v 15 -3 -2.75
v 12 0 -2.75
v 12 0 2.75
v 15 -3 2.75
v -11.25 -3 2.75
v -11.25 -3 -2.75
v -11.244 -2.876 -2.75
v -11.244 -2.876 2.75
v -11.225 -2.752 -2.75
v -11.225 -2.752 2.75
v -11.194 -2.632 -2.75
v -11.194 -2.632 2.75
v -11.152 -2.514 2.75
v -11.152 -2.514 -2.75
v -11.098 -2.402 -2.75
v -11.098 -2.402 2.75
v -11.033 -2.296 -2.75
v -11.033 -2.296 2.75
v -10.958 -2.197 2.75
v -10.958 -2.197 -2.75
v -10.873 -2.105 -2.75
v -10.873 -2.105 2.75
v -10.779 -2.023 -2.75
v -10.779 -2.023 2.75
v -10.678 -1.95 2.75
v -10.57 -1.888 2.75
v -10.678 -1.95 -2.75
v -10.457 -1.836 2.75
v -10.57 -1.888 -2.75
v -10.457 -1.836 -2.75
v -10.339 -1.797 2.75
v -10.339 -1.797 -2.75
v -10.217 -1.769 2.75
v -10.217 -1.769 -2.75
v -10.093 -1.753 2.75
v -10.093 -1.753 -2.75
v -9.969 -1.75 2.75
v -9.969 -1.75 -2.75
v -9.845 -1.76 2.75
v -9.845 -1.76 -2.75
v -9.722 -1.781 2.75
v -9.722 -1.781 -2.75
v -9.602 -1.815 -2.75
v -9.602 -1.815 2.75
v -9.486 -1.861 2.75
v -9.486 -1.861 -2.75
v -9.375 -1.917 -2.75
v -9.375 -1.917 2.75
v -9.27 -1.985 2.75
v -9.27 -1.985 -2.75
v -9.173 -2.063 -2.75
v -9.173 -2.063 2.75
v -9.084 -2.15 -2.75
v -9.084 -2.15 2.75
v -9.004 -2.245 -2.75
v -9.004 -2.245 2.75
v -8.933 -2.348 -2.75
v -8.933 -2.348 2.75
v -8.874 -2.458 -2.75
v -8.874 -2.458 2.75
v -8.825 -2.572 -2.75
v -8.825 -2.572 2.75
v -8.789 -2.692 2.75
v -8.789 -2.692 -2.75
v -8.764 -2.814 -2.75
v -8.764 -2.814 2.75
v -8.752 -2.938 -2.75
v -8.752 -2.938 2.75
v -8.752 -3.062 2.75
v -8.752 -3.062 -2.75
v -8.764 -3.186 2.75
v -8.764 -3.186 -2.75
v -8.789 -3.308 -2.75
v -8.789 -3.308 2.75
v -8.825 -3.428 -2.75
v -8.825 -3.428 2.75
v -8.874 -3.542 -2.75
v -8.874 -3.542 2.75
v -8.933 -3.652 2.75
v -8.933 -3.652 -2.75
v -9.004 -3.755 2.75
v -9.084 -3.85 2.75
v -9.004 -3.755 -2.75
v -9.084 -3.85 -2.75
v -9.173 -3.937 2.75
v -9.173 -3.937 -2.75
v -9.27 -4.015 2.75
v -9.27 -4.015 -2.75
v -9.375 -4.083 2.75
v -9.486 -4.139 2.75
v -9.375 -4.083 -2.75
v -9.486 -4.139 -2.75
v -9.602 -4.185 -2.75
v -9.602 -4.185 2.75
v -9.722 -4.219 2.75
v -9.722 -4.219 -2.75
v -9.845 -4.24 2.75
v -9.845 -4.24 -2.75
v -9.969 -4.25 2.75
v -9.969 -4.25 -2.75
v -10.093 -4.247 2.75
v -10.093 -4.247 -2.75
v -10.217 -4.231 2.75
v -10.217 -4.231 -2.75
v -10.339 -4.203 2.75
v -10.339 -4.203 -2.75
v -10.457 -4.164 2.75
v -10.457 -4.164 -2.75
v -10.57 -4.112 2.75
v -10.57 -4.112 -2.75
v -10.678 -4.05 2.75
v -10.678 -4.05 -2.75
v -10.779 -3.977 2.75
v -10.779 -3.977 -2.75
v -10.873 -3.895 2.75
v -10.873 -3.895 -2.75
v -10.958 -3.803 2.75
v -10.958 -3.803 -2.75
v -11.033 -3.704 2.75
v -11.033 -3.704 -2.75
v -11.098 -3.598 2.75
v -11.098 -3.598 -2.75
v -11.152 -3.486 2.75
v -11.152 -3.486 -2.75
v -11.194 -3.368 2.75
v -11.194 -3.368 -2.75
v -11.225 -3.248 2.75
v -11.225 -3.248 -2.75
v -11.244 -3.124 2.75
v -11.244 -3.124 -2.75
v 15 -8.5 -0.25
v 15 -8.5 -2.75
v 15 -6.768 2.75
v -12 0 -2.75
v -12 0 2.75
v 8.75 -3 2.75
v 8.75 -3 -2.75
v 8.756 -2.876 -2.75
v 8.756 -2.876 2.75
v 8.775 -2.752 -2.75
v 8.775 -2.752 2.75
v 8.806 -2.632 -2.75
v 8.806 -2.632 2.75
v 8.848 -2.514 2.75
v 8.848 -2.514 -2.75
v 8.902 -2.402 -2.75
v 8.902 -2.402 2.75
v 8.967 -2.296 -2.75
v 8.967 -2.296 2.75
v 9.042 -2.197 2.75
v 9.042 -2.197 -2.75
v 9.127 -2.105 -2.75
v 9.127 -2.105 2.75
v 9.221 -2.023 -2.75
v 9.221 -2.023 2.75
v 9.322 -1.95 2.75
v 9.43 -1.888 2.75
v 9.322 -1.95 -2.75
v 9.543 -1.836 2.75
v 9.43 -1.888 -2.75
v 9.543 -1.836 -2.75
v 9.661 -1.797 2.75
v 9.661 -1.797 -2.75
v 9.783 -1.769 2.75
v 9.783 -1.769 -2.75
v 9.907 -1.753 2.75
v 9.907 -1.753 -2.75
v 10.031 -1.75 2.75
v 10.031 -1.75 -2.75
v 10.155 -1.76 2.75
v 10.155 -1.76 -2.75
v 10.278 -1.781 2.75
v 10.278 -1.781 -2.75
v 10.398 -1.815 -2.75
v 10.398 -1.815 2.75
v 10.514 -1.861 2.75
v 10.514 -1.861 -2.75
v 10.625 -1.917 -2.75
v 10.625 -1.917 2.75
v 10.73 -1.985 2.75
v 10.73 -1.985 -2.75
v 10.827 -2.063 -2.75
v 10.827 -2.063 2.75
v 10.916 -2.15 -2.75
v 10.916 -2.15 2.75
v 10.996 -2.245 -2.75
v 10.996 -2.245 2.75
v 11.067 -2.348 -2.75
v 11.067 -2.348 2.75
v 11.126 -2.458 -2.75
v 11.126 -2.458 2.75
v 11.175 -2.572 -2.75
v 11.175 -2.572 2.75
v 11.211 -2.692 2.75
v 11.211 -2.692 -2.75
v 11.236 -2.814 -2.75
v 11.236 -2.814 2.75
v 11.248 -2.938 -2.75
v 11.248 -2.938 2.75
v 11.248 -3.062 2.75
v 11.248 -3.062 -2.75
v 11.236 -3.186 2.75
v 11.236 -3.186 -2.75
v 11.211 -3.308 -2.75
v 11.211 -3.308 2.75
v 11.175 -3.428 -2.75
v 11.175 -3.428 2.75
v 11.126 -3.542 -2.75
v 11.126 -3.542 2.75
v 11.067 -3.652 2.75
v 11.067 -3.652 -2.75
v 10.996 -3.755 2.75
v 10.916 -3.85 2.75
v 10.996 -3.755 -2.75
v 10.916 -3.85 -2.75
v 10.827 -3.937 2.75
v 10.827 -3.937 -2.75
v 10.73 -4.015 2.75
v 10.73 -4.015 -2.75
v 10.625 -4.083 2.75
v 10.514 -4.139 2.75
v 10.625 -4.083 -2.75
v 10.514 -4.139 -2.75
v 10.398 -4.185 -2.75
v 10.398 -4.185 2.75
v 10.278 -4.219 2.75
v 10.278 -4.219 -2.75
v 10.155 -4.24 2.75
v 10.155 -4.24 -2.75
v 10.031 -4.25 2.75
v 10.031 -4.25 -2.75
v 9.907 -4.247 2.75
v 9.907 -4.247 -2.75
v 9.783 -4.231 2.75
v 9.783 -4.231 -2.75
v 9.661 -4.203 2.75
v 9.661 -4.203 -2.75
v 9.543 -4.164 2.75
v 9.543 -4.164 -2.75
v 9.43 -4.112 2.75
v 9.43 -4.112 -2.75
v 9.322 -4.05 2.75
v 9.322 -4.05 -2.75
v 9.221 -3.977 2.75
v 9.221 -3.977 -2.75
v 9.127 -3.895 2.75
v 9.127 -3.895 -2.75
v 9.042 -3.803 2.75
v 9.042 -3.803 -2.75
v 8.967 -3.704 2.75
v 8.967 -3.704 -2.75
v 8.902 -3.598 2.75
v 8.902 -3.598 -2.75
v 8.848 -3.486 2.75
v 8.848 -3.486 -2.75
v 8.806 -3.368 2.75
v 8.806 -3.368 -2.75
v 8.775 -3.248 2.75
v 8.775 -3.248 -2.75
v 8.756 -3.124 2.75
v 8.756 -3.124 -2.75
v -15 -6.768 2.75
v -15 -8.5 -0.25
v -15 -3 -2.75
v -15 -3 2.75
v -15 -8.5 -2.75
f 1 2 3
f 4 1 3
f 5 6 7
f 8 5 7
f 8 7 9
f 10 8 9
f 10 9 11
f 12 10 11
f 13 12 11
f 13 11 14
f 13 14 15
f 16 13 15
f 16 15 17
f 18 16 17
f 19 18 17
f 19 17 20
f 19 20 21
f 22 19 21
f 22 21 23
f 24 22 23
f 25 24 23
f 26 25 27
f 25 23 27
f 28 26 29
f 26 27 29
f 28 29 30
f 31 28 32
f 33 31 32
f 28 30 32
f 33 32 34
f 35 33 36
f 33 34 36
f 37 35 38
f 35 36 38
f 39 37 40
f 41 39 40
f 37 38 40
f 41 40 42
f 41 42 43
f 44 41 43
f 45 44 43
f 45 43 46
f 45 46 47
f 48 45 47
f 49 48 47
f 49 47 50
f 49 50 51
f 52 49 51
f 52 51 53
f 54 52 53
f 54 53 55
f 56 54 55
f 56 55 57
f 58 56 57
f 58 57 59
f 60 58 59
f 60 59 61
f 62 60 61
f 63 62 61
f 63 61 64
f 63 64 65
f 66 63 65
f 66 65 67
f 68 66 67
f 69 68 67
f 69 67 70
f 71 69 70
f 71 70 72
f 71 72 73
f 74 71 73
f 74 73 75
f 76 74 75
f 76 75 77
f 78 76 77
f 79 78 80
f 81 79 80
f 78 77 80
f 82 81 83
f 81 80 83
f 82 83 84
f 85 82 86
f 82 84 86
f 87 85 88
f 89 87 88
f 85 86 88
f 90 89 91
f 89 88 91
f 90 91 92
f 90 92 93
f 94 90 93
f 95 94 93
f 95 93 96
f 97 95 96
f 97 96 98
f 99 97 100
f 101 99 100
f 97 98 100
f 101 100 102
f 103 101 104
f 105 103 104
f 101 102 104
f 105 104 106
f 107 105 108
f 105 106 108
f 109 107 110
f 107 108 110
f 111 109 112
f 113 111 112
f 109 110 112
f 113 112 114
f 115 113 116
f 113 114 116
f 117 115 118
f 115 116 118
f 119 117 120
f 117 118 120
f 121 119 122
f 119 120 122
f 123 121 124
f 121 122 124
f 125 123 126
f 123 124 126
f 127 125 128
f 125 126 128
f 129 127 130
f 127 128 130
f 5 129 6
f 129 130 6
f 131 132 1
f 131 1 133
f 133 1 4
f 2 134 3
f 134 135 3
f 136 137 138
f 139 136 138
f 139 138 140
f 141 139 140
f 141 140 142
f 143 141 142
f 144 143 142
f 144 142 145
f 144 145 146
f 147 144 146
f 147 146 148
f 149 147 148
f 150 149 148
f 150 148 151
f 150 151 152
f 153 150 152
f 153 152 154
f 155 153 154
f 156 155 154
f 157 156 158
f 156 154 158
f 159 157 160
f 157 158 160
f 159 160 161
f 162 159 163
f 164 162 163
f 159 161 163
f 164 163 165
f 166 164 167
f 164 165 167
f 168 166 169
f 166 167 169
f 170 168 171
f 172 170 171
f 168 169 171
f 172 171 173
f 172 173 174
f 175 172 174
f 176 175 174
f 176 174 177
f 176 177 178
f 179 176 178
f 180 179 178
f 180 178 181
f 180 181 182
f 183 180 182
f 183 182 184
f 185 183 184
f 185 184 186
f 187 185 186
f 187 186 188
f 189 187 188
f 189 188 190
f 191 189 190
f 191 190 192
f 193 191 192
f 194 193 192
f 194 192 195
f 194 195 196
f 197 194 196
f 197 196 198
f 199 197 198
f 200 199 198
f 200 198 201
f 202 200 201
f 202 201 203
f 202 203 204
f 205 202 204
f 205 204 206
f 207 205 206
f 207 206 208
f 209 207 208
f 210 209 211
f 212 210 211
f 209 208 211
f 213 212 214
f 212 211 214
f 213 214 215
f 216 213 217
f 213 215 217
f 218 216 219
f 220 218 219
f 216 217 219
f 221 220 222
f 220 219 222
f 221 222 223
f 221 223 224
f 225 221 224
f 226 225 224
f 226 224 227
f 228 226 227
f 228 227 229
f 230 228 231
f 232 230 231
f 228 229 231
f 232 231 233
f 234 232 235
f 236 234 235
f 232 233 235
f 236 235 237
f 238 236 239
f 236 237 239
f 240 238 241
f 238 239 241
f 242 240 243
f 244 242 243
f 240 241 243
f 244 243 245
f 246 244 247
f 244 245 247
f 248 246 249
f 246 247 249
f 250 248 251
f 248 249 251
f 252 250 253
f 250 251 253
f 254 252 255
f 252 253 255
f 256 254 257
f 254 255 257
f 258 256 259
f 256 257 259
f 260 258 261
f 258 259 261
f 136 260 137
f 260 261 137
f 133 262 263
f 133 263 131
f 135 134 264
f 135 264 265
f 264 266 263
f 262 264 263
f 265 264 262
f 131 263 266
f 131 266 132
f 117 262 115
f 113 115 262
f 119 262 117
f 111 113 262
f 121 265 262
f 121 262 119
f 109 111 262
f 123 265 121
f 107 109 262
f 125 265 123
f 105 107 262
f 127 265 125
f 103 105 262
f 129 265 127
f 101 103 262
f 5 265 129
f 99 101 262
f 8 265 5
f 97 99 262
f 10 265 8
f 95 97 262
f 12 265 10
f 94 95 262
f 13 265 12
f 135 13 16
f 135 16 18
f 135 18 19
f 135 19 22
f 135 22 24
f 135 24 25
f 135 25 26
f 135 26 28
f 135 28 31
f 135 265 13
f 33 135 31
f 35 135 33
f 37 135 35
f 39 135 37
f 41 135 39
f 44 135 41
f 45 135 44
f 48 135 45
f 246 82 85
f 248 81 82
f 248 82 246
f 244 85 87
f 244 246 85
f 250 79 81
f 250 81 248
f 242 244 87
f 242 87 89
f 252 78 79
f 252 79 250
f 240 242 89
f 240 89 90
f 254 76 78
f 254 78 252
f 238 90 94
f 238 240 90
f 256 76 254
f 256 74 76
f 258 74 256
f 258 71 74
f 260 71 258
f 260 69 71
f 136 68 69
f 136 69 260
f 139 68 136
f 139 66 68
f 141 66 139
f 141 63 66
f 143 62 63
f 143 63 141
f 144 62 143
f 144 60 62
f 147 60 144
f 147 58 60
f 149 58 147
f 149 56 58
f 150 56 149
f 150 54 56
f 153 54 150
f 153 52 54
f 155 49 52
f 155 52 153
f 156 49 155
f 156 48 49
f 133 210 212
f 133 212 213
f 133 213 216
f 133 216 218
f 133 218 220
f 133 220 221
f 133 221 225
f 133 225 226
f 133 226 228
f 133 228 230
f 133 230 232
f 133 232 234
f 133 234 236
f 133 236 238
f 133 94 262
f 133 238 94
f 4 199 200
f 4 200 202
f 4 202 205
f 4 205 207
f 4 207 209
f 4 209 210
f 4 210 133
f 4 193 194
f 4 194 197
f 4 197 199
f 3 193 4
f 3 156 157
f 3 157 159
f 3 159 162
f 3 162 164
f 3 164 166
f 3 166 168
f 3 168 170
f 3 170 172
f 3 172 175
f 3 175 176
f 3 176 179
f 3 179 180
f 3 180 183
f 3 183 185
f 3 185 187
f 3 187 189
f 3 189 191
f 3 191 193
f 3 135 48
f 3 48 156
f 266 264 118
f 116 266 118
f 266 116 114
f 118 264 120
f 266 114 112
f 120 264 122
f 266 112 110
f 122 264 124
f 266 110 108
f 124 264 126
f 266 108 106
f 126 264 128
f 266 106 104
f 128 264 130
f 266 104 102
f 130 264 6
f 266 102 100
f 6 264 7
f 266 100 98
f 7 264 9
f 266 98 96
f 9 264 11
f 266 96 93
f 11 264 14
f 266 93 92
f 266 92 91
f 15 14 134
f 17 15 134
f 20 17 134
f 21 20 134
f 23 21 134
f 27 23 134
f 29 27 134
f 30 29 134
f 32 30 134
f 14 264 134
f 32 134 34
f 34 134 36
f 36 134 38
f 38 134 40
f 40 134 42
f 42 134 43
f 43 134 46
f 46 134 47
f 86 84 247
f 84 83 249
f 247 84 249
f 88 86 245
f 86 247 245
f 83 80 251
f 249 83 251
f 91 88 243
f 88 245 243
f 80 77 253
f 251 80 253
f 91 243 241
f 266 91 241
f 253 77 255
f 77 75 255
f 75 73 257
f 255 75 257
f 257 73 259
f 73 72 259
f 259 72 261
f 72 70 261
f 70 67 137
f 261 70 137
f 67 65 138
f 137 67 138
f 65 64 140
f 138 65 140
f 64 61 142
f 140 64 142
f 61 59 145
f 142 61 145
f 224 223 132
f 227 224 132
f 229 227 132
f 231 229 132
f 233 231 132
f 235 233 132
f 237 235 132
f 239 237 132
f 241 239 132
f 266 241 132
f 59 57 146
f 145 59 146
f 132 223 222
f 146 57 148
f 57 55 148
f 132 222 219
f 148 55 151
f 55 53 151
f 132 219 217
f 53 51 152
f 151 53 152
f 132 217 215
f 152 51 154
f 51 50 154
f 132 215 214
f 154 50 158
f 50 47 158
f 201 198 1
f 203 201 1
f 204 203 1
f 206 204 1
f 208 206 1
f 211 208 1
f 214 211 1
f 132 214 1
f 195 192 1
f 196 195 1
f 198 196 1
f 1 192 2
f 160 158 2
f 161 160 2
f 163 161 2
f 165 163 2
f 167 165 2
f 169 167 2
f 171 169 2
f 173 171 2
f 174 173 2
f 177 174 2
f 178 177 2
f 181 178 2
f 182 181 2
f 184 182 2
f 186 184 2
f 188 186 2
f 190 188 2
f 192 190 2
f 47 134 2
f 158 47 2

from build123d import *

# Parameters (mm, degrees)
F0_W     = 30
F0_H     = 5.5
F1_DEPTH = 8.5
F2_SIZE  = 3
F3_SIZE2 = 1.7320508076
F3_SIZE  = 3
F5_D     = 2.5


with BuildPart() as f1:
    # F0 (on Front) → F1 (new body)
    with BuildSketch(Plane.XZ):
        Rectangle(F0_W, F0_H)
    extrude(amount=F1_DEPTH)

    # F2
    f2_edges = [f1.edges().sort_by_distance(p)[0] for p in [
        (-15, 0, 0),
        (15, 0, 0),
    ]]
    chamfer(f2_edges, length=F2_SIZE)

    # F3
    f3_edges = [f1.edges().sort_by_distance(p)[0] for p in [
        (0, -8.5, 2.75),
    ]]
    f3_side = f1.faces().sort_by_distance((0, -8.5, 0))[0]
    chamfer(f3_edges, length=F3_SIZE, length2=F3_SIZE2, reference=f3_side)

    # F5 (through all)
    with Locations(Plane.XY.offset(2.75)):
        with Locations((-10, -3), (10, -3)):
            Hole(F5_D / 2)


solid = f1.part
